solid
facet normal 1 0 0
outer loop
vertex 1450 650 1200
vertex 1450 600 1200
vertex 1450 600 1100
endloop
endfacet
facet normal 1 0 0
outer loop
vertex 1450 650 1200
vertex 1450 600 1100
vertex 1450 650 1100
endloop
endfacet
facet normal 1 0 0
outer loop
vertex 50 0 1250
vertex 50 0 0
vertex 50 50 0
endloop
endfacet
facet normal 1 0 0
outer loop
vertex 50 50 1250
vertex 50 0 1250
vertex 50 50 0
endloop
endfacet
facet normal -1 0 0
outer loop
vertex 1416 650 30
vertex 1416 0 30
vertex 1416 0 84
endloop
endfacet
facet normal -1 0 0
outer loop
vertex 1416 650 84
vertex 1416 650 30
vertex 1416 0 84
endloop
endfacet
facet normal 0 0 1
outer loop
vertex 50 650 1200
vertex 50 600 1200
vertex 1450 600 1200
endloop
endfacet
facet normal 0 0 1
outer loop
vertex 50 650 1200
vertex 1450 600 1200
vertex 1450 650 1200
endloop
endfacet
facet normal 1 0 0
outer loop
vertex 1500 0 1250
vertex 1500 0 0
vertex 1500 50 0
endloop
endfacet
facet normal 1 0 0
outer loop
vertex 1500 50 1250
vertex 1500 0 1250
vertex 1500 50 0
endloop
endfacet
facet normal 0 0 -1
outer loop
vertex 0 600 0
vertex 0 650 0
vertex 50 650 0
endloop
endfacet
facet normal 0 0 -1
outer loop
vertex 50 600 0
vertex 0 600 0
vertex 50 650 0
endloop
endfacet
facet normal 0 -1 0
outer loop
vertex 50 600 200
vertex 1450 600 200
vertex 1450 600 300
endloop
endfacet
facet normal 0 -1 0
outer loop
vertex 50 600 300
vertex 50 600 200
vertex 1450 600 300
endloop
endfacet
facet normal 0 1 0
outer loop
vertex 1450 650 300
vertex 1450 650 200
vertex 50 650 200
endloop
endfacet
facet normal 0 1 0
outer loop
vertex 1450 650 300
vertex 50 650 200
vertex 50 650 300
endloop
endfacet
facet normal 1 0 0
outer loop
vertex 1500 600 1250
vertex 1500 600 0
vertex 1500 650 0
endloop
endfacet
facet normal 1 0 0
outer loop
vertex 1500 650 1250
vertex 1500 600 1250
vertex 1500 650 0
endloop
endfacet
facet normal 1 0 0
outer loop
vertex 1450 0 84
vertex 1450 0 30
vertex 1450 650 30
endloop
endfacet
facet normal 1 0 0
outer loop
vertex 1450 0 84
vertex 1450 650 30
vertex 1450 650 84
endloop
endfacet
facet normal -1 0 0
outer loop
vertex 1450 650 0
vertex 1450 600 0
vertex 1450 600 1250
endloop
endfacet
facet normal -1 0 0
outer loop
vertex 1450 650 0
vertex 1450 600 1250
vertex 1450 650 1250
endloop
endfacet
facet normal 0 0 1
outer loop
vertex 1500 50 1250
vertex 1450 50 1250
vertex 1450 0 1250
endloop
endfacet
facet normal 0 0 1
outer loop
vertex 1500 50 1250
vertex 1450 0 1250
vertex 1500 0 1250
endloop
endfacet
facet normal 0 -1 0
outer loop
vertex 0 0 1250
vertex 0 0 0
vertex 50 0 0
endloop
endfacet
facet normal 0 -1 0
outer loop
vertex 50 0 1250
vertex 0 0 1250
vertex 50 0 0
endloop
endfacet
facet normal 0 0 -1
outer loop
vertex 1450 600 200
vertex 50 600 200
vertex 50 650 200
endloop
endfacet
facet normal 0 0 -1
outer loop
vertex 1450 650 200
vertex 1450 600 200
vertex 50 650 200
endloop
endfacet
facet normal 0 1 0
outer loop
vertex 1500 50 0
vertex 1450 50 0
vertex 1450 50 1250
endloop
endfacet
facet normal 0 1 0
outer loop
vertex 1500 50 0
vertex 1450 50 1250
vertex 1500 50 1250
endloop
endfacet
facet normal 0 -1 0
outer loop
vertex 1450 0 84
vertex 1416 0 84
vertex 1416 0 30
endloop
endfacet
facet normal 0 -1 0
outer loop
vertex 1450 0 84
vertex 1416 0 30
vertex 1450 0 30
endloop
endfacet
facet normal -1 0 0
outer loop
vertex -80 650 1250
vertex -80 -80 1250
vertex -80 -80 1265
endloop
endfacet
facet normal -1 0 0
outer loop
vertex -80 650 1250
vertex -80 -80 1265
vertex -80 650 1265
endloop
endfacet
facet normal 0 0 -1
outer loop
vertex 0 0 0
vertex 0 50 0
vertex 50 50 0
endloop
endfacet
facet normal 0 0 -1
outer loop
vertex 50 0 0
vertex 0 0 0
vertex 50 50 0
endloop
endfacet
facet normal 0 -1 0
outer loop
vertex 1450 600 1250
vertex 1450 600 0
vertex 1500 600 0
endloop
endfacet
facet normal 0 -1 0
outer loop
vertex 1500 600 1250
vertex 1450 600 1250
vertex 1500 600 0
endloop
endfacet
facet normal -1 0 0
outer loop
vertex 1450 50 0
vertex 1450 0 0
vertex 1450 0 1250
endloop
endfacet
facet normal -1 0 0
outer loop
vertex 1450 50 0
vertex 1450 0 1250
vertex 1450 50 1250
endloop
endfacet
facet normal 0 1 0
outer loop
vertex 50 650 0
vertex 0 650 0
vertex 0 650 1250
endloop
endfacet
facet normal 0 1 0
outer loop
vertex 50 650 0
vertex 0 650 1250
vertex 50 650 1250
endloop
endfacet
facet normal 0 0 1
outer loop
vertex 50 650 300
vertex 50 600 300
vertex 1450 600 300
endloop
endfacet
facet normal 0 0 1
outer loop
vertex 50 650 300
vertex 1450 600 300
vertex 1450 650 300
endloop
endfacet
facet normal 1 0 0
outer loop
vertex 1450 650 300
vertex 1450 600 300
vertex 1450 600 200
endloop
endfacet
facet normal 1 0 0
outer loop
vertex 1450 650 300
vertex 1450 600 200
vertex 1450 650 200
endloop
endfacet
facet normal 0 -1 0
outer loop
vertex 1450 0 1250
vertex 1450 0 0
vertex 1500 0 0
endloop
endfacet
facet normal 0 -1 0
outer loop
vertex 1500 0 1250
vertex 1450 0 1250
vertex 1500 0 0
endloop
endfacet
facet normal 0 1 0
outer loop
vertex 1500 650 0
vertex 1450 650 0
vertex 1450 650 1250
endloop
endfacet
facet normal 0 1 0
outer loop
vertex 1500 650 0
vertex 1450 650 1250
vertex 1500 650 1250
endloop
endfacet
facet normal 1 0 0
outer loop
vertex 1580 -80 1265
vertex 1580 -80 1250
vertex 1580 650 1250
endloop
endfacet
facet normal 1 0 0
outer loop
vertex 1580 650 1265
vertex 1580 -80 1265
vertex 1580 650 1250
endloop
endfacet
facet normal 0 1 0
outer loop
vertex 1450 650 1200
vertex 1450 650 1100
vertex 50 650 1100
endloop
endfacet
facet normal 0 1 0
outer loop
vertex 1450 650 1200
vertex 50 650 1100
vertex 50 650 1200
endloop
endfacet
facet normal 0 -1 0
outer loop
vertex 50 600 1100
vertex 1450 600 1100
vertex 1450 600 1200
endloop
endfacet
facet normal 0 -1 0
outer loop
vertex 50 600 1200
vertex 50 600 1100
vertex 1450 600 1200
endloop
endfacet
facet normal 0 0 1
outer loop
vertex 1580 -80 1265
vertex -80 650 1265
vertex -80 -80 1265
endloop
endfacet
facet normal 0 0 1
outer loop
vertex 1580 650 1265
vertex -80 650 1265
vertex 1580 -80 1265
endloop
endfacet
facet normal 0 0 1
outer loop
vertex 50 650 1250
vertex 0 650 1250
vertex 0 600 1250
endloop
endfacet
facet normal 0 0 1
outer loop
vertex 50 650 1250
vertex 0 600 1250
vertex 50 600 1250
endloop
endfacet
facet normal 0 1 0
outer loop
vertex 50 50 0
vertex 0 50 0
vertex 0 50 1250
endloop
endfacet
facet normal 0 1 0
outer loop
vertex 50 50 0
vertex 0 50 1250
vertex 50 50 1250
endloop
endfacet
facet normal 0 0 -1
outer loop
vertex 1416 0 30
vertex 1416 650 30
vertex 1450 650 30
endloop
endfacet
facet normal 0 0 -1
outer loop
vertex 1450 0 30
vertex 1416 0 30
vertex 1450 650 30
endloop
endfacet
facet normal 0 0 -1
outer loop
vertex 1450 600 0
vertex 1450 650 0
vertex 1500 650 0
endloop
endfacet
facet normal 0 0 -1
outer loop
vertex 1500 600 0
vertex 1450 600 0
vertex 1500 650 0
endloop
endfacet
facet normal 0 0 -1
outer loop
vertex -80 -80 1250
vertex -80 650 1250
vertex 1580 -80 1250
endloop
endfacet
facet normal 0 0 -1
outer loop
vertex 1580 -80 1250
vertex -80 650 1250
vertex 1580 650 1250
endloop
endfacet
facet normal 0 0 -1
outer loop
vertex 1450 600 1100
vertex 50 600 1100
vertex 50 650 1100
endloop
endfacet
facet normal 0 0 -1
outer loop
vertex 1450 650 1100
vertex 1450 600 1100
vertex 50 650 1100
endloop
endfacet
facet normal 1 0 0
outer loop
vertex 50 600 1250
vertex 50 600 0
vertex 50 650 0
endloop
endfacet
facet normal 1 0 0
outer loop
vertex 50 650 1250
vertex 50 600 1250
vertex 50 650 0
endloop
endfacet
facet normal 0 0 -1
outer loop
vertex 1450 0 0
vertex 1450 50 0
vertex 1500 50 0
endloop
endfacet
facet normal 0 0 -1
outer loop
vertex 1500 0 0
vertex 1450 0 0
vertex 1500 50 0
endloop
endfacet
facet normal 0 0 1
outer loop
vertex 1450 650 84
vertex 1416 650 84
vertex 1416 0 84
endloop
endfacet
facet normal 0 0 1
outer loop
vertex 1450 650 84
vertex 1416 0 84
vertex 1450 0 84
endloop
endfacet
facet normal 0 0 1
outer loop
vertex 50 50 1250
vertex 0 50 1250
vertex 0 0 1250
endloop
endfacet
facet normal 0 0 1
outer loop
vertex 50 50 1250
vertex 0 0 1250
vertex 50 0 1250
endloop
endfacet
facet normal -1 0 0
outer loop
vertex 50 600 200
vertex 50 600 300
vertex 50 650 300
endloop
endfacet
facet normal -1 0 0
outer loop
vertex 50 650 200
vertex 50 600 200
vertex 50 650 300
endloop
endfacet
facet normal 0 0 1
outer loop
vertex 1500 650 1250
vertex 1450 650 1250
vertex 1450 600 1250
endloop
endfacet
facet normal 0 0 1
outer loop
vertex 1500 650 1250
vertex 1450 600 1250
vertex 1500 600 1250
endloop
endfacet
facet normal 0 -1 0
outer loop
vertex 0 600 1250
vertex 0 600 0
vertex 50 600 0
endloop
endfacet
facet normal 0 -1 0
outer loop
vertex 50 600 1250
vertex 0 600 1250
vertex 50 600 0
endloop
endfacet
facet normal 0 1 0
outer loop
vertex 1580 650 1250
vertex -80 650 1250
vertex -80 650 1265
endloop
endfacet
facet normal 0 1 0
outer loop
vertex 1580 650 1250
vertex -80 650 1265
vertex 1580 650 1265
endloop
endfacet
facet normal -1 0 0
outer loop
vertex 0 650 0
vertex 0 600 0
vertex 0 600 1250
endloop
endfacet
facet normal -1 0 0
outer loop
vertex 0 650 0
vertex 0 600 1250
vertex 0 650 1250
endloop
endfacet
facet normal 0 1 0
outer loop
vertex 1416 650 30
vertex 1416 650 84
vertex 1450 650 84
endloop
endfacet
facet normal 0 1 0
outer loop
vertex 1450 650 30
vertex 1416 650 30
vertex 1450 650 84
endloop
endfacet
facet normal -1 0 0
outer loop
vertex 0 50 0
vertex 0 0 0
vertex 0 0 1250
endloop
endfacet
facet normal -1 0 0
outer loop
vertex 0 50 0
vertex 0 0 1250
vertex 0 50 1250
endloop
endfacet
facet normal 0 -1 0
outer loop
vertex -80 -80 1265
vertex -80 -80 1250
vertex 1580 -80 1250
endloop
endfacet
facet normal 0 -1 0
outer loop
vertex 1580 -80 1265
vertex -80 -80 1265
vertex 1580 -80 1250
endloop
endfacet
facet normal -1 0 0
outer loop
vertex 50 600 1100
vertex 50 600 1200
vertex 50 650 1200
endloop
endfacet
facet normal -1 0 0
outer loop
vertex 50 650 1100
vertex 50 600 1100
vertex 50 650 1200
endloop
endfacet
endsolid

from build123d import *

# Parameters (mm, degrees)
F0_W          = 50
F0_H          = 50
F1_DEPTH      = 1250
F2_W          = 1660
F2_H          = 730
F2_W_2        = 50
F2_H_2        = 50
F3_DEPTH      = 15
F4_W          = 50
F4_H          = 100
F5_DEPTH      = 1400
F6_W          = 34
F6_H          = 54
F7_DEPTH      = 600
F7_DEPTH_BACK = 50


with BuildPart() as f1:
    # F0 (on Top) → F1 (new body)
    with BuildSketch(Plane.XY):
        with Locations((25, 25)):
            Rectangle(F0_W, F0_H)
        with Locations((1475, 25)):
            Rectangle(F0_W, F0_H)
        with Locations((1475, 625)):
            Rectangle(F0_W, F0_H)
        with Locations((25, 625)):
            Rectangle(F0_W, F0_H)
    extrude(amount=F1_DEPTH)


with BuildPart() as f3:
    # F2 (on face) → F3 (new body)
    with BuildSketch(Plane.XY.offset(1250)):
        with Locations((750, 285)):
            Rectangle(F2_W, F2_H)
        with Locations((25, 25)):
            Rectangle(F2_W_2, F2_H_2, mode=Mode.SUBTRACT)
        with Locations((25, 25)):
            Rectangle(F2_W_2, F2_H_2)
    extrude(amount=F3_DEPTH)


with BuildPart() as f5:
    # F4 (on face) → F5 (new body, through all)
    with BuildSketch(Plane.YZ.offset(50)):
        with Locations((625, 250)):
            Rectangle(F4_W, F4_H)
        with Locations((625, 1150)):
            Rectangle(F4_W, F4_H)
    extrude(amount=F5_DEPTH)


with BuildPart() as f7:
    # F6 (on face) → F7 (new body, two sides)
    with BuildSketch(Plane.XZ.offset(-600)) as f7_sk:
        with Locations((1433, 57)):
            Rectangle(F6_W, F6_H)
    extrude(amount=F7_DEPTH)
    extrude(f7_sk.sketch, amount=-F7_DEPTH_BACK)


solid = Compound([f1.part, f3.part, f5.part, f7.part])
